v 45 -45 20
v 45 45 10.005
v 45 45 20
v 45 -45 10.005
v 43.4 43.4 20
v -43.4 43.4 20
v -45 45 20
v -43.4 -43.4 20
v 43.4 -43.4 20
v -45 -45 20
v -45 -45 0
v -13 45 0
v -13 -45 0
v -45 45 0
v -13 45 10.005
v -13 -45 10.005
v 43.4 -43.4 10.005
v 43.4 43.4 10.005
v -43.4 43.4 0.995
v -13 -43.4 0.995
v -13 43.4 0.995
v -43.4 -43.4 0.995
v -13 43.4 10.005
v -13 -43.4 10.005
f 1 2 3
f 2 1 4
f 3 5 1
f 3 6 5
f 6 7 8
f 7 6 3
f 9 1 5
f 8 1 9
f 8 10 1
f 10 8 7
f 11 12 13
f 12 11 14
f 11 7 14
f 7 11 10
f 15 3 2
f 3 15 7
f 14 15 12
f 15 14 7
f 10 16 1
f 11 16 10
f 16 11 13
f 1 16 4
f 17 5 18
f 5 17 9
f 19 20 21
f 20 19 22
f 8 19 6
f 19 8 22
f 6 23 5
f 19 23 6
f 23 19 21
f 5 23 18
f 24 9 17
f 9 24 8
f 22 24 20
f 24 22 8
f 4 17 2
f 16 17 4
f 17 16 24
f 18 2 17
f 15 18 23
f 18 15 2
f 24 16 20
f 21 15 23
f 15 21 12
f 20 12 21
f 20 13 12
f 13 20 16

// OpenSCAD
module cover(){
    difference(){
    translate([0, 0, 10])cube([90, 90, 20],center=true);
    translate([0, 0, 20-19/2])cube([86.8, 86.8, 19.01],center=true);
    //
    translate([90/2-(90-32)/2, 0, 5])cube([90-32, 99, 10.01],center=true);
    }
}


cover();
